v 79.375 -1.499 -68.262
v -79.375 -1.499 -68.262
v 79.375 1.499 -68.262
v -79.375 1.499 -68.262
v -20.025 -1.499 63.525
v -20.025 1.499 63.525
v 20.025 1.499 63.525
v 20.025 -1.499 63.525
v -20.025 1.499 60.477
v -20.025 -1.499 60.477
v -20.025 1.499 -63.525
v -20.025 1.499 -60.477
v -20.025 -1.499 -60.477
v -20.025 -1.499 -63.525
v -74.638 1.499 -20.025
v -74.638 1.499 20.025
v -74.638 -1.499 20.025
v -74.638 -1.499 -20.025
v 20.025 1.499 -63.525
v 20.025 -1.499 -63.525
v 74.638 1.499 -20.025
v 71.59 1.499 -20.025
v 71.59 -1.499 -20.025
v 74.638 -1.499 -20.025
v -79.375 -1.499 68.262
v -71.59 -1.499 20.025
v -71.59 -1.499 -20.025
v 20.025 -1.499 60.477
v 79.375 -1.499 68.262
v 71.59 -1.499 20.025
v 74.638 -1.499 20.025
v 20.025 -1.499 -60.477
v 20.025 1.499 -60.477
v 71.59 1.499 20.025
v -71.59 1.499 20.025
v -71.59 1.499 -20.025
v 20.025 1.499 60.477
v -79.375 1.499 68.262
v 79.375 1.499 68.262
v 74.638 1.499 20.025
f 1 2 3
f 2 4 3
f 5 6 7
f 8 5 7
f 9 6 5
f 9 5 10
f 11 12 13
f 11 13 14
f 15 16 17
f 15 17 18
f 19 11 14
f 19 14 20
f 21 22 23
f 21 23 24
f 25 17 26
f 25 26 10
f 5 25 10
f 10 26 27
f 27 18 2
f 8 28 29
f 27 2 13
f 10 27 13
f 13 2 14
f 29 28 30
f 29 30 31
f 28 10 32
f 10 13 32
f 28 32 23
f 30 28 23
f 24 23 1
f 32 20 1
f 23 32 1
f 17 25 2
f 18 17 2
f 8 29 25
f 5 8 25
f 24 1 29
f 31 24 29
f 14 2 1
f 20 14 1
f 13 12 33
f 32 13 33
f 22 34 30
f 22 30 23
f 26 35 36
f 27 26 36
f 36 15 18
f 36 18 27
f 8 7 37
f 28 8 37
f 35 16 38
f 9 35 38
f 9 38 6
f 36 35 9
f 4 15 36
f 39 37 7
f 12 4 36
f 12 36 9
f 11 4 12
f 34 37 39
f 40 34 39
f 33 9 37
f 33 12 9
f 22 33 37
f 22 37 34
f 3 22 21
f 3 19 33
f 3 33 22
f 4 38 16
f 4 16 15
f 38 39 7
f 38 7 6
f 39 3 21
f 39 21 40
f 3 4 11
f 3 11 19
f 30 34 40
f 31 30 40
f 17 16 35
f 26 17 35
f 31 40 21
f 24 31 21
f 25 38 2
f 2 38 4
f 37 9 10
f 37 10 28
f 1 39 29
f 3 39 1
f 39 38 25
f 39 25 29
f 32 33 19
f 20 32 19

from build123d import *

# Parameters (mm, degrees)
SKETCH1_W           = 158.75
SKETCH1_H           = 136.525
BOSS_EXTRUDE1_DEPTH = 1.4986
SKETCH2_W           = 40.0508
SKETCH2_H           = 3.048
SKETCH2_W_2         = 3.048
SKETCH2_H_2         = 40.0508
CUT_EXTRUDE1_DEPTH  = 3.9972


with BuildPart() as part:
    # Sketch1 → Boss-Extrude1 (new body, symmetric)
    with BuildSketch(Plane(origin=(0, 0, 0), x_dir=(1, 0, 0), z_dir=(0, 1, 0))):
        Rectangle(SKETCH1_W, SKETCH1_H)
    extrude(amount=BOSS_EXTRUDE1_DEPTH, both=True)

    # Sketch2 → Cut-Extrude1 (cut, through all)
    with BuildSketch(Plane(origin=(0, 1.4986, 0), x_dir=(1, 0, 0), z_dir=(0, 1, 0))):
        with Locations((0, 62.0014)):
            Rectangle(SKETCH2_W, SKETCH2_H)
        with Locations((-73.1139, 0)):
            Rectangle(SKETCH2_W_2, SKETCH2_H_2)
        with Locations((0, -62.0014)):
            Rectangle(SKETCH2_W, SKETCH2_H)
        with Locations((73.1139, 0)):
            Rectangle(SKETCH2_W_2, SKETCH2_H_2)
    extrude(amount=-CUT_EXTRUDE1_DEPTH, mode=Mode.SUBTRACT)


solid = part.part
